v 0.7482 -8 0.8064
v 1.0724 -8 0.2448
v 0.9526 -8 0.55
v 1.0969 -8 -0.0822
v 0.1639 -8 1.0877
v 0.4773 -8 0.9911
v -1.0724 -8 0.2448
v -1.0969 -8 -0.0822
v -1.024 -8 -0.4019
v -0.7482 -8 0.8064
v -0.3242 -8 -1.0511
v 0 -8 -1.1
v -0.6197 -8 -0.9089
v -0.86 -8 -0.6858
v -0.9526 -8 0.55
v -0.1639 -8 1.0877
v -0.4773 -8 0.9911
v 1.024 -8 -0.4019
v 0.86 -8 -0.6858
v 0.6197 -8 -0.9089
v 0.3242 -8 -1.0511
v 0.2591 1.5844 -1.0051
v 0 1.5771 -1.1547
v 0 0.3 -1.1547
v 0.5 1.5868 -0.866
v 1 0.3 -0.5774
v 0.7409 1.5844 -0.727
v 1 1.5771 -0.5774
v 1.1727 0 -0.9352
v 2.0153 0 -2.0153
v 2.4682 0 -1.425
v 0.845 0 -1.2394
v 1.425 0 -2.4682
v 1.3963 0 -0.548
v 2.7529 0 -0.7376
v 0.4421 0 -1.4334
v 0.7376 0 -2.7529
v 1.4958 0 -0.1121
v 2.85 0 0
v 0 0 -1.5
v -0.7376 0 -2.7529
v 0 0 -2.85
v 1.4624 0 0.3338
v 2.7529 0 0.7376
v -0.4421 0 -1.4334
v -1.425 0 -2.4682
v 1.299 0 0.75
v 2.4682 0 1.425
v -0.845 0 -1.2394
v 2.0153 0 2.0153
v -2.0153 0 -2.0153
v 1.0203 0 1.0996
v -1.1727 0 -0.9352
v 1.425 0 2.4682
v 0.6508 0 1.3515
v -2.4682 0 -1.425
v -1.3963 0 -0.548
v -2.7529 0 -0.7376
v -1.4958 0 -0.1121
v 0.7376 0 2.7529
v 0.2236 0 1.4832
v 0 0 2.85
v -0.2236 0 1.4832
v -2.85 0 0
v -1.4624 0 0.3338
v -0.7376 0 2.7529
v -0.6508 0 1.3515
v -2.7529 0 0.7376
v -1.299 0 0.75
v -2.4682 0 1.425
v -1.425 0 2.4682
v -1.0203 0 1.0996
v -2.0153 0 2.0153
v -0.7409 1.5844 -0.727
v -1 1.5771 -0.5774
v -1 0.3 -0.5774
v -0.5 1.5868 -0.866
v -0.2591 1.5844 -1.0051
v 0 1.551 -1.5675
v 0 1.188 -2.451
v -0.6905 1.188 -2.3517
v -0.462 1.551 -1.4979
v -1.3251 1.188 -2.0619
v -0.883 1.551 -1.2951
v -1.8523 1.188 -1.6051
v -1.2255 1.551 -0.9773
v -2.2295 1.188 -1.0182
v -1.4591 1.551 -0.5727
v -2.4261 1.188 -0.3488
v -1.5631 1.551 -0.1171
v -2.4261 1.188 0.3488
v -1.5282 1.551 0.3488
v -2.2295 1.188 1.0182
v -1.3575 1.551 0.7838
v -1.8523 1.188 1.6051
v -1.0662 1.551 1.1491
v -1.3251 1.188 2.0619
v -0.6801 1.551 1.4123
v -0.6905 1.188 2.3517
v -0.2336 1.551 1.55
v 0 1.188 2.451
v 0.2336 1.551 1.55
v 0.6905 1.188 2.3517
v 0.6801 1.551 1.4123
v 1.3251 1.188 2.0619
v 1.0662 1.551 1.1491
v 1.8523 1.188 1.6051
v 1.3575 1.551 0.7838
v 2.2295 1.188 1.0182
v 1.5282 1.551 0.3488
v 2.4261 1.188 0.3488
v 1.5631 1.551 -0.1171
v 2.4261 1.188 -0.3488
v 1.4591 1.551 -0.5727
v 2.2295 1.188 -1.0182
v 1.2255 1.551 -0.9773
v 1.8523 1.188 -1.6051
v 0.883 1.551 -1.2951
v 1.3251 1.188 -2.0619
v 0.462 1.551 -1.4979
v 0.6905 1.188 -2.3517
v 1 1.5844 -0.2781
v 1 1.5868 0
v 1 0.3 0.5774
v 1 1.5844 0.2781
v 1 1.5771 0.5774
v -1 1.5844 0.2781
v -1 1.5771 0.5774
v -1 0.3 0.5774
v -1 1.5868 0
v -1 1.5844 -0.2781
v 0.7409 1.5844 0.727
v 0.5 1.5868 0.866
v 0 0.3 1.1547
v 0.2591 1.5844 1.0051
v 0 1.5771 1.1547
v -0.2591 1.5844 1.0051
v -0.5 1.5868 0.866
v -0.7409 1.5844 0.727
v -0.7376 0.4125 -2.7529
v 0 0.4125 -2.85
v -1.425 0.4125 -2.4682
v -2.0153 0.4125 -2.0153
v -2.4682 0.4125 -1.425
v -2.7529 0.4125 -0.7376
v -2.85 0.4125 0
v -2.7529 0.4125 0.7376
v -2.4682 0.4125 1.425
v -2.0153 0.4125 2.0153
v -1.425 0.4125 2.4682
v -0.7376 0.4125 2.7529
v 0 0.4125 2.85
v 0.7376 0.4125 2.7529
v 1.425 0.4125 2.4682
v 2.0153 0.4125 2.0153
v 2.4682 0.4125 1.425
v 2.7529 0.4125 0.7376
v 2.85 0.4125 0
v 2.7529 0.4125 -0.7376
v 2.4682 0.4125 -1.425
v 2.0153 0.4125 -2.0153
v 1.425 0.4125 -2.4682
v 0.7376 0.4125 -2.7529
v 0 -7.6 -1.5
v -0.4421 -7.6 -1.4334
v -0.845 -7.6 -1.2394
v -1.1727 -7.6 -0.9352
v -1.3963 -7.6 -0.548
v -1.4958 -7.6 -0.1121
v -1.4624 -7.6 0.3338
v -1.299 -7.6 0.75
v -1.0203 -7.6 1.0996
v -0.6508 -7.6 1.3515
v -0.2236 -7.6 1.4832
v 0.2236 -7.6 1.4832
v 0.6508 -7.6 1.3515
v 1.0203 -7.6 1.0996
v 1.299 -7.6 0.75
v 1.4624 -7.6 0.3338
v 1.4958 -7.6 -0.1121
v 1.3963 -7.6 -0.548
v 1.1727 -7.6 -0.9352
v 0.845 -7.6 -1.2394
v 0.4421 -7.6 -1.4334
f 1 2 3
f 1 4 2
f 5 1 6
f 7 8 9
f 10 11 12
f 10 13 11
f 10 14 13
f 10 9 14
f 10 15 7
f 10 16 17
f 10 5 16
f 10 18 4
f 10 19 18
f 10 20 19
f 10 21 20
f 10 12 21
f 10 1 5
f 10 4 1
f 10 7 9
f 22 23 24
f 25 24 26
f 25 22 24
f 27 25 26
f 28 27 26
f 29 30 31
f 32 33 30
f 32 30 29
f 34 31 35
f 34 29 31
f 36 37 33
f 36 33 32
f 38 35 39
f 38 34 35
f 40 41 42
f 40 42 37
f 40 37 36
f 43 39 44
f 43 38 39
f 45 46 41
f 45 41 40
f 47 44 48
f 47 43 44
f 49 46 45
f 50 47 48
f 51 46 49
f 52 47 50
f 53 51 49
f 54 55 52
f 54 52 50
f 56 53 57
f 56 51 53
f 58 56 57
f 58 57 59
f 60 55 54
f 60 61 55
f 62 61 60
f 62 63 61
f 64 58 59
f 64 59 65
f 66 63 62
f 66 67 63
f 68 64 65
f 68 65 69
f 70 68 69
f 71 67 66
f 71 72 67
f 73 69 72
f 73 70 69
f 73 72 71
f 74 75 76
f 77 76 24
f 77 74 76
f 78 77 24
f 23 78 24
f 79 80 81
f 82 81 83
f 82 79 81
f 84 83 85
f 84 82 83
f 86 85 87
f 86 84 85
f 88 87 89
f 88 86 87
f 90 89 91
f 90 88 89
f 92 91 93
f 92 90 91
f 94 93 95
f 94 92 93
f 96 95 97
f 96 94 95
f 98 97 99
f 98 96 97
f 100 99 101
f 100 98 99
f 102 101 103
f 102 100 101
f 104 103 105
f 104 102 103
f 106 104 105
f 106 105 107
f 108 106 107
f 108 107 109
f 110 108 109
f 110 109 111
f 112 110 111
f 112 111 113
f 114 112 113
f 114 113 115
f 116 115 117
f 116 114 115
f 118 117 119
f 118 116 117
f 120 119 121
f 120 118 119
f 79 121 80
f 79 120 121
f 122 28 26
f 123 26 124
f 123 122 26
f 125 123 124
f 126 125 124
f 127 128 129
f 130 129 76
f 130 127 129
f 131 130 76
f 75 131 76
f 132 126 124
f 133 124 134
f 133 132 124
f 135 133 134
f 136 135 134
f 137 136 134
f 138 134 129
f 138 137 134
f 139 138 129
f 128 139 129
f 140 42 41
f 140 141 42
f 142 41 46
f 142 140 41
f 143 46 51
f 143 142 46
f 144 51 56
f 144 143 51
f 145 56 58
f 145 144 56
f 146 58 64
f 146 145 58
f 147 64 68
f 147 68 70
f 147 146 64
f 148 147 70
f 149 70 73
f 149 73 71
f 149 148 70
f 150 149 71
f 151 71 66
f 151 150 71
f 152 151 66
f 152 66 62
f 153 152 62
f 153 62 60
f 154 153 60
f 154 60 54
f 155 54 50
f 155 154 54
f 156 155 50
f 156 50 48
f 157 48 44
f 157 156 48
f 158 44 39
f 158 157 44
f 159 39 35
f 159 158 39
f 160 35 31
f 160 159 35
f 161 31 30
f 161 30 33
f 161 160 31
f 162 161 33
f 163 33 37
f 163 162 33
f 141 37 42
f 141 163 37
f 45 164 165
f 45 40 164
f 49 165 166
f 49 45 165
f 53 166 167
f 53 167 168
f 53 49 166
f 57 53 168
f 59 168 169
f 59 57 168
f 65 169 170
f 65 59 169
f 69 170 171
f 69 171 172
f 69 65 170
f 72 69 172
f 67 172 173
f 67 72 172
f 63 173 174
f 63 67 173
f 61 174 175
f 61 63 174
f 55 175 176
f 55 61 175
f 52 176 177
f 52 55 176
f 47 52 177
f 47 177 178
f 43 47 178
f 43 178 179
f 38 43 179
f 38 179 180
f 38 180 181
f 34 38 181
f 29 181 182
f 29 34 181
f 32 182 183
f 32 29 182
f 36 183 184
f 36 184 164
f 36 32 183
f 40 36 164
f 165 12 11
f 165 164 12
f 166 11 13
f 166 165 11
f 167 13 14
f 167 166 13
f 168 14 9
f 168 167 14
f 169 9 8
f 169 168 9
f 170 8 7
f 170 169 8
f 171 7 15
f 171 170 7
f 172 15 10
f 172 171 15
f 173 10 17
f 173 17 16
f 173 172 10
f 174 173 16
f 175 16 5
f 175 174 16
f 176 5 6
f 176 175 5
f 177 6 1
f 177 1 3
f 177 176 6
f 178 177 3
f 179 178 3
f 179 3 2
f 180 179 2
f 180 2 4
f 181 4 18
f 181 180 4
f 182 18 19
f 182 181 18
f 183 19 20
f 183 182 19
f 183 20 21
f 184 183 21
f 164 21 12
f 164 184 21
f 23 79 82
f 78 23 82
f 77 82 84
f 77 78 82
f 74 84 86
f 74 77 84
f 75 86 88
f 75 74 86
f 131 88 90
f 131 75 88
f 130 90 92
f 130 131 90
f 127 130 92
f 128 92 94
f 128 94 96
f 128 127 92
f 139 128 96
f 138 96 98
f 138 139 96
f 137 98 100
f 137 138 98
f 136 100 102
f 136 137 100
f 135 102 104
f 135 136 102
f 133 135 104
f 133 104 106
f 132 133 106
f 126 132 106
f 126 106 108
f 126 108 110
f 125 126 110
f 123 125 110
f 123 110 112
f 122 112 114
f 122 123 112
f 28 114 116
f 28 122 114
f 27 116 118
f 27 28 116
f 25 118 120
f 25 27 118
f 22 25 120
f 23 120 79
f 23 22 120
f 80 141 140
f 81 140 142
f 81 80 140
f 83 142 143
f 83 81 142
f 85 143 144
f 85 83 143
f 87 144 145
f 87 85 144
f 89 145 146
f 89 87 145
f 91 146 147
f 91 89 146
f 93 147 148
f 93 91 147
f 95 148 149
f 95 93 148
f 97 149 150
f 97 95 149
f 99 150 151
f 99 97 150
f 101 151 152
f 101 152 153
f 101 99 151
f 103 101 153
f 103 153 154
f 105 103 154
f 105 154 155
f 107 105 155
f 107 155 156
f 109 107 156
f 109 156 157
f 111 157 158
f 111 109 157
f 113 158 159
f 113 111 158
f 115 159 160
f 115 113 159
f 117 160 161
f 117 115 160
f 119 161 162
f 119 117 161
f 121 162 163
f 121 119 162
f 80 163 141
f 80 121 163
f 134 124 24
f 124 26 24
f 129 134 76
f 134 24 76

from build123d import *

# Parameters (mm, degrees)
CUT_EXTRUDE1_DEPTH = 1.35


with BuildPart() as part:
    # Sketch1 → Revolve1 (revolve)
    with BuildSketch(Plane.XY, mode=Mode.PRIVATE) as revolve1_sk:
        Polygon((0, -8), (1.1, -8), (1.5, -7.6), (1.5, 0), (2.85, 0), (2.85, 0.4125), (2.451, 1.188), (1.5675, 1.551), (0, 1.65), align=None)
    revolve(revolve1_sk.sketch.rotate(Axis((0, -10, 0), (0, 1, 0)), 90), axis=Axis((0, -10, 0), (0, 1, 0)))

    # Sketch2 → Cut-Extrude1 (cut)
    with BuildSketch(Plane(origin=(0, 1.65, 0), x_dir=(1, 0, 0), z_dir=(0, 1, 0))):
        Polygon((1, -0.577350269), (0, -1.154700538), (-1, -0.577350269), (-1, 0.577350269), (0, 1.154700538), (1, 0.577350269), align=None)
    extrude(amount=-CUT_EXTRUDE1_DEPTH, mode=Mode.SUBTRACT)


solid = part.part
